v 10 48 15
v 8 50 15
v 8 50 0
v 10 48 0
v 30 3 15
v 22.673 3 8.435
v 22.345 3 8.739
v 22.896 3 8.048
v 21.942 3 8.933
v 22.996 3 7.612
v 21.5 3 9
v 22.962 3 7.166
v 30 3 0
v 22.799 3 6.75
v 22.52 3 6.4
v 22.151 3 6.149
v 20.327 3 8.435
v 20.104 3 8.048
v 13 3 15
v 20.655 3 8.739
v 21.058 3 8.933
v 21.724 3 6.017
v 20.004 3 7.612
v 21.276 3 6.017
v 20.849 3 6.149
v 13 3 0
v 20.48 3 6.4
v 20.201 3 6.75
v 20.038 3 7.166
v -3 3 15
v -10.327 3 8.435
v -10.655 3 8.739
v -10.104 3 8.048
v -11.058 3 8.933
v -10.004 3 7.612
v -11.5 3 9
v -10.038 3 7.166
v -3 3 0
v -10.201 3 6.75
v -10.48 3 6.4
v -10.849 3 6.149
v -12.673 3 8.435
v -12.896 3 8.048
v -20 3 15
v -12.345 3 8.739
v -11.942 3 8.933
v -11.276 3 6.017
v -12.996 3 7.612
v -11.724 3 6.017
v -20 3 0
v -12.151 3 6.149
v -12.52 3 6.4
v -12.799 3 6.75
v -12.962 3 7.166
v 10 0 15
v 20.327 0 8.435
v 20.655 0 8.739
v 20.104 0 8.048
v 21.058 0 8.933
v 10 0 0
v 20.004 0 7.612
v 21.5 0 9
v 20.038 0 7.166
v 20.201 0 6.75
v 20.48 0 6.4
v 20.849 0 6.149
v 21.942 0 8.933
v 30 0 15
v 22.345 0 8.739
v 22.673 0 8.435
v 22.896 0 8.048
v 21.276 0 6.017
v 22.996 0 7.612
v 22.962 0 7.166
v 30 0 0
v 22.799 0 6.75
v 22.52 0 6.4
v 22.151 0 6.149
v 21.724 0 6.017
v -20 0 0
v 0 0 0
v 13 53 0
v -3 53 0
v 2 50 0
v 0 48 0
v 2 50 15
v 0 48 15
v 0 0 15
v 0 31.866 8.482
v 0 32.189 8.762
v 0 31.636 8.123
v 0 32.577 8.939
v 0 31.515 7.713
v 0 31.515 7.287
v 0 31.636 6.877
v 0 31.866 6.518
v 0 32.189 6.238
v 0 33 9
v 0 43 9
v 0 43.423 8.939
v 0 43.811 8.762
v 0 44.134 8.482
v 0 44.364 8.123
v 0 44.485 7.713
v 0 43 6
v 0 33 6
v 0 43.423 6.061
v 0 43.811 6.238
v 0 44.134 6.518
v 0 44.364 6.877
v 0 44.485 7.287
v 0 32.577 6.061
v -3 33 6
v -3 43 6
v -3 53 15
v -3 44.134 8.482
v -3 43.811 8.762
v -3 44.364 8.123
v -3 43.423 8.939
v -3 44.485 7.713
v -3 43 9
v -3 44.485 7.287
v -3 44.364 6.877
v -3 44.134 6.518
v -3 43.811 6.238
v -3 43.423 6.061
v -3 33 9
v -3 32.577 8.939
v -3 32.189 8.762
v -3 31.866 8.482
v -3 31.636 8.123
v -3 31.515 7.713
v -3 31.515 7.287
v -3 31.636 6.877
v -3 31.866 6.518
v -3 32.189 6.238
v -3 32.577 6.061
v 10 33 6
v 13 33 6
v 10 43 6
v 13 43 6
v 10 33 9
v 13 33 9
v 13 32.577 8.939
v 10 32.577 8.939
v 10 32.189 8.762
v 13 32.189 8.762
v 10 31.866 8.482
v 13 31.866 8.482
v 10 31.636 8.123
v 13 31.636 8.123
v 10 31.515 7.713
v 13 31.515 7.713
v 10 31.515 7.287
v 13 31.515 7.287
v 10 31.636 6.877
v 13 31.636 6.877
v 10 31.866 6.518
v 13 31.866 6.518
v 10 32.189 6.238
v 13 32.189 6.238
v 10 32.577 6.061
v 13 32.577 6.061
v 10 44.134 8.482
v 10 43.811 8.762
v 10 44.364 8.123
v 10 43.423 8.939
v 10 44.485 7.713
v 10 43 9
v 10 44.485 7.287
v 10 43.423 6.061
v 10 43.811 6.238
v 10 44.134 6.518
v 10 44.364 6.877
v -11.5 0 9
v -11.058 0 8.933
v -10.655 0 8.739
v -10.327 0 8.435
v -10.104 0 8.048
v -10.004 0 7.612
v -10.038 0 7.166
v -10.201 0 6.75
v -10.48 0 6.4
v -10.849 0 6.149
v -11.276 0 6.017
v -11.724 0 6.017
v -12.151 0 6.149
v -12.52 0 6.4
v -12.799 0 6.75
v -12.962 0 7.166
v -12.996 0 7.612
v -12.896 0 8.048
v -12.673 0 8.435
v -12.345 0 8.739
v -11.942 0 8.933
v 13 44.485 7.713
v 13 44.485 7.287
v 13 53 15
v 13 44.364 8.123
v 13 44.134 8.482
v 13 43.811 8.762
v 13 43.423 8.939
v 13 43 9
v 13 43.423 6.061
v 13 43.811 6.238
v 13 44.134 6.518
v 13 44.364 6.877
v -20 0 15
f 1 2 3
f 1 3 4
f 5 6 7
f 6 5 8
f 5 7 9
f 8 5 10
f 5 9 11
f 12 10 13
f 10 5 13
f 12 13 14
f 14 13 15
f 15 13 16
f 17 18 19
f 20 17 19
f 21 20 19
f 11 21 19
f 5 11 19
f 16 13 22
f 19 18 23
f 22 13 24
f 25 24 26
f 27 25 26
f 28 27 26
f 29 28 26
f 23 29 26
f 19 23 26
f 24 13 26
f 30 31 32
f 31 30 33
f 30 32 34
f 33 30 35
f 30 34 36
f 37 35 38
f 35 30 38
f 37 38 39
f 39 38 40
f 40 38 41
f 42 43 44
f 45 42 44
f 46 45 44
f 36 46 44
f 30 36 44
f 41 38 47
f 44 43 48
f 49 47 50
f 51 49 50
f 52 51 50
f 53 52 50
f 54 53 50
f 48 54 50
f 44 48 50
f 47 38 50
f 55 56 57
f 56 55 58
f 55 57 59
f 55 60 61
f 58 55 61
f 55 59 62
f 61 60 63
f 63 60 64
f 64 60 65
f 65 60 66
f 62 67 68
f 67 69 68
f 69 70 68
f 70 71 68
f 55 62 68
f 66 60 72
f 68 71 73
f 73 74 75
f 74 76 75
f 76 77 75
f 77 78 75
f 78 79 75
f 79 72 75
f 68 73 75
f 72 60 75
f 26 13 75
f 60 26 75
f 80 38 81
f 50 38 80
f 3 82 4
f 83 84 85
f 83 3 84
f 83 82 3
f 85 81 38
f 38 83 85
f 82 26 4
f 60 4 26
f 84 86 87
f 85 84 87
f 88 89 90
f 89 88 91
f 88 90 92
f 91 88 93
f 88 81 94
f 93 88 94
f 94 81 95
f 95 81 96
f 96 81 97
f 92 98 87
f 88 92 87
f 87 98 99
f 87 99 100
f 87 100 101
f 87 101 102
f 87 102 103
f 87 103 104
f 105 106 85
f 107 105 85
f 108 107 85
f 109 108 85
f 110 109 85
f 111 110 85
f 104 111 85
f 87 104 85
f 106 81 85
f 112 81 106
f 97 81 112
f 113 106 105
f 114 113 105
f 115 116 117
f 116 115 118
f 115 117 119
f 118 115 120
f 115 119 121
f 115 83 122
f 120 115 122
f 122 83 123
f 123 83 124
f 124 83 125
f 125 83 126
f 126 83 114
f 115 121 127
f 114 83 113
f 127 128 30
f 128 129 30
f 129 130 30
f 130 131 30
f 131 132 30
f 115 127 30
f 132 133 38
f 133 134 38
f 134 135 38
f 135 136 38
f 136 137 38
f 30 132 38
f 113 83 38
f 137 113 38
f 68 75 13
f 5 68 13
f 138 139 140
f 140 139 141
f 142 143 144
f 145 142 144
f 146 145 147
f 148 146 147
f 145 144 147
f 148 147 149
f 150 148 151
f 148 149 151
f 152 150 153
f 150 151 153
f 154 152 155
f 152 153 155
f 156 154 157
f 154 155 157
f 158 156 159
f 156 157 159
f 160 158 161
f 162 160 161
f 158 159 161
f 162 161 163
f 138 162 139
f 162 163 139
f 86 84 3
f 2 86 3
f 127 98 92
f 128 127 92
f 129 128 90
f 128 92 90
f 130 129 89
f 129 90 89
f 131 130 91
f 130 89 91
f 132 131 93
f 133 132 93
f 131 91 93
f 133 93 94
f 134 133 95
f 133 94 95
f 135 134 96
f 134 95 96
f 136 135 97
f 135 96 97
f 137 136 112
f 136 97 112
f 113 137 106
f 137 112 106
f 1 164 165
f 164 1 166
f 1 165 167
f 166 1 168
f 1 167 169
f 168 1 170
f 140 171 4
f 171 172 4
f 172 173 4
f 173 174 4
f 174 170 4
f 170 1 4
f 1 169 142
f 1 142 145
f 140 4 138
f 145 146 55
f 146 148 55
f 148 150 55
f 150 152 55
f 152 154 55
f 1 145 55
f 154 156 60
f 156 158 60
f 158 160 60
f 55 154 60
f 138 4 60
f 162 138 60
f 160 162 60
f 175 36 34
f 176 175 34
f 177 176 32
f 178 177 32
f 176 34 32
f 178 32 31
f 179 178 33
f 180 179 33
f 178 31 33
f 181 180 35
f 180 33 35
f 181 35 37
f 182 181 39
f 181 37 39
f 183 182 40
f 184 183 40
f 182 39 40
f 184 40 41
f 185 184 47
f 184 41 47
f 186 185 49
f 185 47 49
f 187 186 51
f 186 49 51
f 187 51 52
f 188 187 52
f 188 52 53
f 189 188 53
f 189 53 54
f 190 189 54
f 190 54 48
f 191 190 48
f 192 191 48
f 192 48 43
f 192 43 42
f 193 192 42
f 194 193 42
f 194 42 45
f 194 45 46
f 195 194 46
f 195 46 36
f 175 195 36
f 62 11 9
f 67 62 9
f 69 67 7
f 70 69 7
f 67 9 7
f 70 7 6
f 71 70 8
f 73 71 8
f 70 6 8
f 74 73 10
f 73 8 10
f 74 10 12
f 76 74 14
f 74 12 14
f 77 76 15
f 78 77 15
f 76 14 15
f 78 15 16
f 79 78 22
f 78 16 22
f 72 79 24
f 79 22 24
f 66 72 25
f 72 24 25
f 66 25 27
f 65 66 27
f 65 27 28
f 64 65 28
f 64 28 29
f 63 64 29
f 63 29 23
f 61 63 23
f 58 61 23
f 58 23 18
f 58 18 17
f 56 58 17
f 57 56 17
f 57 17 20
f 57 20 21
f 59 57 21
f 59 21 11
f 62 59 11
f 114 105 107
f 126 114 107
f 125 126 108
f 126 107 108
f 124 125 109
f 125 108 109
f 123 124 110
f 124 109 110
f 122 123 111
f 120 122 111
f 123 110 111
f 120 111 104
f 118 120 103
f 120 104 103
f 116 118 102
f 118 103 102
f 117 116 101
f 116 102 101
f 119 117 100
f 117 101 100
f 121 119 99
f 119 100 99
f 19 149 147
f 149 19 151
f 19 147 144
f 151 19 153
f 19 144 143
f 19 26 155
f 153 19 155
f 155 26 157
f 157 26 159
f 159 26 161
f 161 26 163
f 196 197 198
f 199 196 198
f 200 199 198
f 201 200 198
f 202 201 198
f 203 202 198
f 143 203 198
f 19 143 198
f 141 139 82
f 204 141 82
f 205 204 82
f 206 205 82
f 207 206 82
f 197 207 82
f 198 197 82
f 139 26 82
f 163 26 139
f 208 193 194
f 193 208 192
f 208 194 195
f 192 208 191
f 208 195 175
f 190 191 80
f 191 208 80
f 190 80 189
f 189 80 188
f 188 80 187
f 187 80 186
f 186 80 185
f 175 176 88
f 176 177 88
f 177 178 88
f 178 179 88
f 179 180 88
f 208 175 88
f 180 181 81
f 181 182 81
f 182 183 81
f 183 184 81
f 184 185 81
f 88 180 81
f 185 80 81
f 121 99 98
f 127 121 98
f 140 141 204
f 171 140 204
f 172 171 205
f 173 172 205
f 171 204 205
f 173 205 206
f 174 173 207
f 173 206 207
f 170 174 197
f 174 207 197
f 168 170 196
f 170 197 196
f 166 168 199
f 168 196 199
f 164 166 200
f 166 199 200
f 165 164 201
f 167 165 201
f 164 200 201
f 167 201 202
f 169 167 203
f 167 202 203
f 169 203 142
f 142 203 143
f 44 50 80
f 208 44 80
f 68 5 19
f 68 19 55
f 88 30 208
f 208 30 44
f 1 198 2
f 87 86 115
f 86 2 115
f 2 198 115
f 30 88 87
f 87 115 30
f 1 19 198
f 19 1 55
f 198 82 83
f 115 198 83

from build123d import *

# Parameters (mm, degrees)
EXTRUDE_1_DEPTH     = 15
SKETCH_2_R          = 1.5
CUT_EXTRUDE_1_DEPTH = 65.210591027
CUT_EXTRUDE_2_DEPTH = 65.210591027
SKETCH_5_R          = 1.5
CUT_EXTRUDE_3_DEPTH = 61.207972894
EXTRUDE_2_DEPTH     = 15


with BuildPart() as part:
    # 草图1 → 凸台-拉伸1 (new body)
    with BuildSketch(Plane.XY):
        Polygon((0, 0), (0, 50), (10, 50), (10, 0), (30, 0), (30, 3), (13, 3), (13, 53), (-3, 53), (-3, 3), (-20, 3), (-20, 0), align=None)
    extrude(amount=EXTRUDE_1_DEPTH)

    # 草图2 → 切除-拉伸1 (cut, through all)
    with BuildSketch(Plane(origin=(13, 0, 0), x_dir=(0, 0, -1), z_dir=(1, 0, 0))):
        with Locations((-7.5, 43)):
            Circle(SKETCH_2_R)
    extrude(amount=-CUT_EXTRUDE_1_DEPTH, mode=Mode.SUBTRACT)

    # 草图4 → 切除-拉伸2 (cut, through all)
    with BuildSketch(Plane(origin=(13, 0, 0), x_dir=(0, 0, -1), z_dir=(1, 0, 0))):
        with BuildLine():
            ThreePointArc((-6, 43), (-7.5, 41.5), (-9, 43))
            Line((-9, 43), (-9, 33))
            ThreePointArc((-9, 33), (-7.5, 34.5), (-6, 33))
            Line((-6, 33), (-6, 43))
        make_face()
        with BuildLine():
            ThreePointArc((-6, 33), (-7.5, 34.5), (-9, 33))
            Line((-9, 33), (-6, 33))
        make_face()
        with BuildLine():
            Line((-6, 33), (-9, 33))
            ThreePointArc((-9, 33), (-7.5, 31.5), (-6, 33))
        make_face()
    extrude(amount=-CUT_EXTRUDE_2_DEPTH, mode=Mode.SUBTRACT)

    # 草图5 → 切除-拉伸3 (cut, through all)
    with BuildSketch(Plane(origin=(0, 3, 0), x_dir=(1, 0, 0), z_dir=(0, 1, 0))):
        with Locations(Location((-11.5, -7.5, 0), (0, 0, 270))):
            Circle(SKETCH_5_R)
        with Locations(Location((21.5, -7.5, 0), (0, 0, 270))):
            Circle(SKETCH_5_R)
    extrude(amount=-CUT_EXTRUDE_3_DEPTH, mode=Mode.SUBTRACT)

    # 草图6 → 凸台-拉伸2 (add)
    with BuildSketch(Plane.XY.offset(15)):
        Polygon((0, 50), (2, 50), (0, 48), align=None)
        Polygon((10, 50), (8, 50), (10, 48), align=None)
    extrude(amount=-EXTRUDE_2_DEPTH)


solid = part.part
